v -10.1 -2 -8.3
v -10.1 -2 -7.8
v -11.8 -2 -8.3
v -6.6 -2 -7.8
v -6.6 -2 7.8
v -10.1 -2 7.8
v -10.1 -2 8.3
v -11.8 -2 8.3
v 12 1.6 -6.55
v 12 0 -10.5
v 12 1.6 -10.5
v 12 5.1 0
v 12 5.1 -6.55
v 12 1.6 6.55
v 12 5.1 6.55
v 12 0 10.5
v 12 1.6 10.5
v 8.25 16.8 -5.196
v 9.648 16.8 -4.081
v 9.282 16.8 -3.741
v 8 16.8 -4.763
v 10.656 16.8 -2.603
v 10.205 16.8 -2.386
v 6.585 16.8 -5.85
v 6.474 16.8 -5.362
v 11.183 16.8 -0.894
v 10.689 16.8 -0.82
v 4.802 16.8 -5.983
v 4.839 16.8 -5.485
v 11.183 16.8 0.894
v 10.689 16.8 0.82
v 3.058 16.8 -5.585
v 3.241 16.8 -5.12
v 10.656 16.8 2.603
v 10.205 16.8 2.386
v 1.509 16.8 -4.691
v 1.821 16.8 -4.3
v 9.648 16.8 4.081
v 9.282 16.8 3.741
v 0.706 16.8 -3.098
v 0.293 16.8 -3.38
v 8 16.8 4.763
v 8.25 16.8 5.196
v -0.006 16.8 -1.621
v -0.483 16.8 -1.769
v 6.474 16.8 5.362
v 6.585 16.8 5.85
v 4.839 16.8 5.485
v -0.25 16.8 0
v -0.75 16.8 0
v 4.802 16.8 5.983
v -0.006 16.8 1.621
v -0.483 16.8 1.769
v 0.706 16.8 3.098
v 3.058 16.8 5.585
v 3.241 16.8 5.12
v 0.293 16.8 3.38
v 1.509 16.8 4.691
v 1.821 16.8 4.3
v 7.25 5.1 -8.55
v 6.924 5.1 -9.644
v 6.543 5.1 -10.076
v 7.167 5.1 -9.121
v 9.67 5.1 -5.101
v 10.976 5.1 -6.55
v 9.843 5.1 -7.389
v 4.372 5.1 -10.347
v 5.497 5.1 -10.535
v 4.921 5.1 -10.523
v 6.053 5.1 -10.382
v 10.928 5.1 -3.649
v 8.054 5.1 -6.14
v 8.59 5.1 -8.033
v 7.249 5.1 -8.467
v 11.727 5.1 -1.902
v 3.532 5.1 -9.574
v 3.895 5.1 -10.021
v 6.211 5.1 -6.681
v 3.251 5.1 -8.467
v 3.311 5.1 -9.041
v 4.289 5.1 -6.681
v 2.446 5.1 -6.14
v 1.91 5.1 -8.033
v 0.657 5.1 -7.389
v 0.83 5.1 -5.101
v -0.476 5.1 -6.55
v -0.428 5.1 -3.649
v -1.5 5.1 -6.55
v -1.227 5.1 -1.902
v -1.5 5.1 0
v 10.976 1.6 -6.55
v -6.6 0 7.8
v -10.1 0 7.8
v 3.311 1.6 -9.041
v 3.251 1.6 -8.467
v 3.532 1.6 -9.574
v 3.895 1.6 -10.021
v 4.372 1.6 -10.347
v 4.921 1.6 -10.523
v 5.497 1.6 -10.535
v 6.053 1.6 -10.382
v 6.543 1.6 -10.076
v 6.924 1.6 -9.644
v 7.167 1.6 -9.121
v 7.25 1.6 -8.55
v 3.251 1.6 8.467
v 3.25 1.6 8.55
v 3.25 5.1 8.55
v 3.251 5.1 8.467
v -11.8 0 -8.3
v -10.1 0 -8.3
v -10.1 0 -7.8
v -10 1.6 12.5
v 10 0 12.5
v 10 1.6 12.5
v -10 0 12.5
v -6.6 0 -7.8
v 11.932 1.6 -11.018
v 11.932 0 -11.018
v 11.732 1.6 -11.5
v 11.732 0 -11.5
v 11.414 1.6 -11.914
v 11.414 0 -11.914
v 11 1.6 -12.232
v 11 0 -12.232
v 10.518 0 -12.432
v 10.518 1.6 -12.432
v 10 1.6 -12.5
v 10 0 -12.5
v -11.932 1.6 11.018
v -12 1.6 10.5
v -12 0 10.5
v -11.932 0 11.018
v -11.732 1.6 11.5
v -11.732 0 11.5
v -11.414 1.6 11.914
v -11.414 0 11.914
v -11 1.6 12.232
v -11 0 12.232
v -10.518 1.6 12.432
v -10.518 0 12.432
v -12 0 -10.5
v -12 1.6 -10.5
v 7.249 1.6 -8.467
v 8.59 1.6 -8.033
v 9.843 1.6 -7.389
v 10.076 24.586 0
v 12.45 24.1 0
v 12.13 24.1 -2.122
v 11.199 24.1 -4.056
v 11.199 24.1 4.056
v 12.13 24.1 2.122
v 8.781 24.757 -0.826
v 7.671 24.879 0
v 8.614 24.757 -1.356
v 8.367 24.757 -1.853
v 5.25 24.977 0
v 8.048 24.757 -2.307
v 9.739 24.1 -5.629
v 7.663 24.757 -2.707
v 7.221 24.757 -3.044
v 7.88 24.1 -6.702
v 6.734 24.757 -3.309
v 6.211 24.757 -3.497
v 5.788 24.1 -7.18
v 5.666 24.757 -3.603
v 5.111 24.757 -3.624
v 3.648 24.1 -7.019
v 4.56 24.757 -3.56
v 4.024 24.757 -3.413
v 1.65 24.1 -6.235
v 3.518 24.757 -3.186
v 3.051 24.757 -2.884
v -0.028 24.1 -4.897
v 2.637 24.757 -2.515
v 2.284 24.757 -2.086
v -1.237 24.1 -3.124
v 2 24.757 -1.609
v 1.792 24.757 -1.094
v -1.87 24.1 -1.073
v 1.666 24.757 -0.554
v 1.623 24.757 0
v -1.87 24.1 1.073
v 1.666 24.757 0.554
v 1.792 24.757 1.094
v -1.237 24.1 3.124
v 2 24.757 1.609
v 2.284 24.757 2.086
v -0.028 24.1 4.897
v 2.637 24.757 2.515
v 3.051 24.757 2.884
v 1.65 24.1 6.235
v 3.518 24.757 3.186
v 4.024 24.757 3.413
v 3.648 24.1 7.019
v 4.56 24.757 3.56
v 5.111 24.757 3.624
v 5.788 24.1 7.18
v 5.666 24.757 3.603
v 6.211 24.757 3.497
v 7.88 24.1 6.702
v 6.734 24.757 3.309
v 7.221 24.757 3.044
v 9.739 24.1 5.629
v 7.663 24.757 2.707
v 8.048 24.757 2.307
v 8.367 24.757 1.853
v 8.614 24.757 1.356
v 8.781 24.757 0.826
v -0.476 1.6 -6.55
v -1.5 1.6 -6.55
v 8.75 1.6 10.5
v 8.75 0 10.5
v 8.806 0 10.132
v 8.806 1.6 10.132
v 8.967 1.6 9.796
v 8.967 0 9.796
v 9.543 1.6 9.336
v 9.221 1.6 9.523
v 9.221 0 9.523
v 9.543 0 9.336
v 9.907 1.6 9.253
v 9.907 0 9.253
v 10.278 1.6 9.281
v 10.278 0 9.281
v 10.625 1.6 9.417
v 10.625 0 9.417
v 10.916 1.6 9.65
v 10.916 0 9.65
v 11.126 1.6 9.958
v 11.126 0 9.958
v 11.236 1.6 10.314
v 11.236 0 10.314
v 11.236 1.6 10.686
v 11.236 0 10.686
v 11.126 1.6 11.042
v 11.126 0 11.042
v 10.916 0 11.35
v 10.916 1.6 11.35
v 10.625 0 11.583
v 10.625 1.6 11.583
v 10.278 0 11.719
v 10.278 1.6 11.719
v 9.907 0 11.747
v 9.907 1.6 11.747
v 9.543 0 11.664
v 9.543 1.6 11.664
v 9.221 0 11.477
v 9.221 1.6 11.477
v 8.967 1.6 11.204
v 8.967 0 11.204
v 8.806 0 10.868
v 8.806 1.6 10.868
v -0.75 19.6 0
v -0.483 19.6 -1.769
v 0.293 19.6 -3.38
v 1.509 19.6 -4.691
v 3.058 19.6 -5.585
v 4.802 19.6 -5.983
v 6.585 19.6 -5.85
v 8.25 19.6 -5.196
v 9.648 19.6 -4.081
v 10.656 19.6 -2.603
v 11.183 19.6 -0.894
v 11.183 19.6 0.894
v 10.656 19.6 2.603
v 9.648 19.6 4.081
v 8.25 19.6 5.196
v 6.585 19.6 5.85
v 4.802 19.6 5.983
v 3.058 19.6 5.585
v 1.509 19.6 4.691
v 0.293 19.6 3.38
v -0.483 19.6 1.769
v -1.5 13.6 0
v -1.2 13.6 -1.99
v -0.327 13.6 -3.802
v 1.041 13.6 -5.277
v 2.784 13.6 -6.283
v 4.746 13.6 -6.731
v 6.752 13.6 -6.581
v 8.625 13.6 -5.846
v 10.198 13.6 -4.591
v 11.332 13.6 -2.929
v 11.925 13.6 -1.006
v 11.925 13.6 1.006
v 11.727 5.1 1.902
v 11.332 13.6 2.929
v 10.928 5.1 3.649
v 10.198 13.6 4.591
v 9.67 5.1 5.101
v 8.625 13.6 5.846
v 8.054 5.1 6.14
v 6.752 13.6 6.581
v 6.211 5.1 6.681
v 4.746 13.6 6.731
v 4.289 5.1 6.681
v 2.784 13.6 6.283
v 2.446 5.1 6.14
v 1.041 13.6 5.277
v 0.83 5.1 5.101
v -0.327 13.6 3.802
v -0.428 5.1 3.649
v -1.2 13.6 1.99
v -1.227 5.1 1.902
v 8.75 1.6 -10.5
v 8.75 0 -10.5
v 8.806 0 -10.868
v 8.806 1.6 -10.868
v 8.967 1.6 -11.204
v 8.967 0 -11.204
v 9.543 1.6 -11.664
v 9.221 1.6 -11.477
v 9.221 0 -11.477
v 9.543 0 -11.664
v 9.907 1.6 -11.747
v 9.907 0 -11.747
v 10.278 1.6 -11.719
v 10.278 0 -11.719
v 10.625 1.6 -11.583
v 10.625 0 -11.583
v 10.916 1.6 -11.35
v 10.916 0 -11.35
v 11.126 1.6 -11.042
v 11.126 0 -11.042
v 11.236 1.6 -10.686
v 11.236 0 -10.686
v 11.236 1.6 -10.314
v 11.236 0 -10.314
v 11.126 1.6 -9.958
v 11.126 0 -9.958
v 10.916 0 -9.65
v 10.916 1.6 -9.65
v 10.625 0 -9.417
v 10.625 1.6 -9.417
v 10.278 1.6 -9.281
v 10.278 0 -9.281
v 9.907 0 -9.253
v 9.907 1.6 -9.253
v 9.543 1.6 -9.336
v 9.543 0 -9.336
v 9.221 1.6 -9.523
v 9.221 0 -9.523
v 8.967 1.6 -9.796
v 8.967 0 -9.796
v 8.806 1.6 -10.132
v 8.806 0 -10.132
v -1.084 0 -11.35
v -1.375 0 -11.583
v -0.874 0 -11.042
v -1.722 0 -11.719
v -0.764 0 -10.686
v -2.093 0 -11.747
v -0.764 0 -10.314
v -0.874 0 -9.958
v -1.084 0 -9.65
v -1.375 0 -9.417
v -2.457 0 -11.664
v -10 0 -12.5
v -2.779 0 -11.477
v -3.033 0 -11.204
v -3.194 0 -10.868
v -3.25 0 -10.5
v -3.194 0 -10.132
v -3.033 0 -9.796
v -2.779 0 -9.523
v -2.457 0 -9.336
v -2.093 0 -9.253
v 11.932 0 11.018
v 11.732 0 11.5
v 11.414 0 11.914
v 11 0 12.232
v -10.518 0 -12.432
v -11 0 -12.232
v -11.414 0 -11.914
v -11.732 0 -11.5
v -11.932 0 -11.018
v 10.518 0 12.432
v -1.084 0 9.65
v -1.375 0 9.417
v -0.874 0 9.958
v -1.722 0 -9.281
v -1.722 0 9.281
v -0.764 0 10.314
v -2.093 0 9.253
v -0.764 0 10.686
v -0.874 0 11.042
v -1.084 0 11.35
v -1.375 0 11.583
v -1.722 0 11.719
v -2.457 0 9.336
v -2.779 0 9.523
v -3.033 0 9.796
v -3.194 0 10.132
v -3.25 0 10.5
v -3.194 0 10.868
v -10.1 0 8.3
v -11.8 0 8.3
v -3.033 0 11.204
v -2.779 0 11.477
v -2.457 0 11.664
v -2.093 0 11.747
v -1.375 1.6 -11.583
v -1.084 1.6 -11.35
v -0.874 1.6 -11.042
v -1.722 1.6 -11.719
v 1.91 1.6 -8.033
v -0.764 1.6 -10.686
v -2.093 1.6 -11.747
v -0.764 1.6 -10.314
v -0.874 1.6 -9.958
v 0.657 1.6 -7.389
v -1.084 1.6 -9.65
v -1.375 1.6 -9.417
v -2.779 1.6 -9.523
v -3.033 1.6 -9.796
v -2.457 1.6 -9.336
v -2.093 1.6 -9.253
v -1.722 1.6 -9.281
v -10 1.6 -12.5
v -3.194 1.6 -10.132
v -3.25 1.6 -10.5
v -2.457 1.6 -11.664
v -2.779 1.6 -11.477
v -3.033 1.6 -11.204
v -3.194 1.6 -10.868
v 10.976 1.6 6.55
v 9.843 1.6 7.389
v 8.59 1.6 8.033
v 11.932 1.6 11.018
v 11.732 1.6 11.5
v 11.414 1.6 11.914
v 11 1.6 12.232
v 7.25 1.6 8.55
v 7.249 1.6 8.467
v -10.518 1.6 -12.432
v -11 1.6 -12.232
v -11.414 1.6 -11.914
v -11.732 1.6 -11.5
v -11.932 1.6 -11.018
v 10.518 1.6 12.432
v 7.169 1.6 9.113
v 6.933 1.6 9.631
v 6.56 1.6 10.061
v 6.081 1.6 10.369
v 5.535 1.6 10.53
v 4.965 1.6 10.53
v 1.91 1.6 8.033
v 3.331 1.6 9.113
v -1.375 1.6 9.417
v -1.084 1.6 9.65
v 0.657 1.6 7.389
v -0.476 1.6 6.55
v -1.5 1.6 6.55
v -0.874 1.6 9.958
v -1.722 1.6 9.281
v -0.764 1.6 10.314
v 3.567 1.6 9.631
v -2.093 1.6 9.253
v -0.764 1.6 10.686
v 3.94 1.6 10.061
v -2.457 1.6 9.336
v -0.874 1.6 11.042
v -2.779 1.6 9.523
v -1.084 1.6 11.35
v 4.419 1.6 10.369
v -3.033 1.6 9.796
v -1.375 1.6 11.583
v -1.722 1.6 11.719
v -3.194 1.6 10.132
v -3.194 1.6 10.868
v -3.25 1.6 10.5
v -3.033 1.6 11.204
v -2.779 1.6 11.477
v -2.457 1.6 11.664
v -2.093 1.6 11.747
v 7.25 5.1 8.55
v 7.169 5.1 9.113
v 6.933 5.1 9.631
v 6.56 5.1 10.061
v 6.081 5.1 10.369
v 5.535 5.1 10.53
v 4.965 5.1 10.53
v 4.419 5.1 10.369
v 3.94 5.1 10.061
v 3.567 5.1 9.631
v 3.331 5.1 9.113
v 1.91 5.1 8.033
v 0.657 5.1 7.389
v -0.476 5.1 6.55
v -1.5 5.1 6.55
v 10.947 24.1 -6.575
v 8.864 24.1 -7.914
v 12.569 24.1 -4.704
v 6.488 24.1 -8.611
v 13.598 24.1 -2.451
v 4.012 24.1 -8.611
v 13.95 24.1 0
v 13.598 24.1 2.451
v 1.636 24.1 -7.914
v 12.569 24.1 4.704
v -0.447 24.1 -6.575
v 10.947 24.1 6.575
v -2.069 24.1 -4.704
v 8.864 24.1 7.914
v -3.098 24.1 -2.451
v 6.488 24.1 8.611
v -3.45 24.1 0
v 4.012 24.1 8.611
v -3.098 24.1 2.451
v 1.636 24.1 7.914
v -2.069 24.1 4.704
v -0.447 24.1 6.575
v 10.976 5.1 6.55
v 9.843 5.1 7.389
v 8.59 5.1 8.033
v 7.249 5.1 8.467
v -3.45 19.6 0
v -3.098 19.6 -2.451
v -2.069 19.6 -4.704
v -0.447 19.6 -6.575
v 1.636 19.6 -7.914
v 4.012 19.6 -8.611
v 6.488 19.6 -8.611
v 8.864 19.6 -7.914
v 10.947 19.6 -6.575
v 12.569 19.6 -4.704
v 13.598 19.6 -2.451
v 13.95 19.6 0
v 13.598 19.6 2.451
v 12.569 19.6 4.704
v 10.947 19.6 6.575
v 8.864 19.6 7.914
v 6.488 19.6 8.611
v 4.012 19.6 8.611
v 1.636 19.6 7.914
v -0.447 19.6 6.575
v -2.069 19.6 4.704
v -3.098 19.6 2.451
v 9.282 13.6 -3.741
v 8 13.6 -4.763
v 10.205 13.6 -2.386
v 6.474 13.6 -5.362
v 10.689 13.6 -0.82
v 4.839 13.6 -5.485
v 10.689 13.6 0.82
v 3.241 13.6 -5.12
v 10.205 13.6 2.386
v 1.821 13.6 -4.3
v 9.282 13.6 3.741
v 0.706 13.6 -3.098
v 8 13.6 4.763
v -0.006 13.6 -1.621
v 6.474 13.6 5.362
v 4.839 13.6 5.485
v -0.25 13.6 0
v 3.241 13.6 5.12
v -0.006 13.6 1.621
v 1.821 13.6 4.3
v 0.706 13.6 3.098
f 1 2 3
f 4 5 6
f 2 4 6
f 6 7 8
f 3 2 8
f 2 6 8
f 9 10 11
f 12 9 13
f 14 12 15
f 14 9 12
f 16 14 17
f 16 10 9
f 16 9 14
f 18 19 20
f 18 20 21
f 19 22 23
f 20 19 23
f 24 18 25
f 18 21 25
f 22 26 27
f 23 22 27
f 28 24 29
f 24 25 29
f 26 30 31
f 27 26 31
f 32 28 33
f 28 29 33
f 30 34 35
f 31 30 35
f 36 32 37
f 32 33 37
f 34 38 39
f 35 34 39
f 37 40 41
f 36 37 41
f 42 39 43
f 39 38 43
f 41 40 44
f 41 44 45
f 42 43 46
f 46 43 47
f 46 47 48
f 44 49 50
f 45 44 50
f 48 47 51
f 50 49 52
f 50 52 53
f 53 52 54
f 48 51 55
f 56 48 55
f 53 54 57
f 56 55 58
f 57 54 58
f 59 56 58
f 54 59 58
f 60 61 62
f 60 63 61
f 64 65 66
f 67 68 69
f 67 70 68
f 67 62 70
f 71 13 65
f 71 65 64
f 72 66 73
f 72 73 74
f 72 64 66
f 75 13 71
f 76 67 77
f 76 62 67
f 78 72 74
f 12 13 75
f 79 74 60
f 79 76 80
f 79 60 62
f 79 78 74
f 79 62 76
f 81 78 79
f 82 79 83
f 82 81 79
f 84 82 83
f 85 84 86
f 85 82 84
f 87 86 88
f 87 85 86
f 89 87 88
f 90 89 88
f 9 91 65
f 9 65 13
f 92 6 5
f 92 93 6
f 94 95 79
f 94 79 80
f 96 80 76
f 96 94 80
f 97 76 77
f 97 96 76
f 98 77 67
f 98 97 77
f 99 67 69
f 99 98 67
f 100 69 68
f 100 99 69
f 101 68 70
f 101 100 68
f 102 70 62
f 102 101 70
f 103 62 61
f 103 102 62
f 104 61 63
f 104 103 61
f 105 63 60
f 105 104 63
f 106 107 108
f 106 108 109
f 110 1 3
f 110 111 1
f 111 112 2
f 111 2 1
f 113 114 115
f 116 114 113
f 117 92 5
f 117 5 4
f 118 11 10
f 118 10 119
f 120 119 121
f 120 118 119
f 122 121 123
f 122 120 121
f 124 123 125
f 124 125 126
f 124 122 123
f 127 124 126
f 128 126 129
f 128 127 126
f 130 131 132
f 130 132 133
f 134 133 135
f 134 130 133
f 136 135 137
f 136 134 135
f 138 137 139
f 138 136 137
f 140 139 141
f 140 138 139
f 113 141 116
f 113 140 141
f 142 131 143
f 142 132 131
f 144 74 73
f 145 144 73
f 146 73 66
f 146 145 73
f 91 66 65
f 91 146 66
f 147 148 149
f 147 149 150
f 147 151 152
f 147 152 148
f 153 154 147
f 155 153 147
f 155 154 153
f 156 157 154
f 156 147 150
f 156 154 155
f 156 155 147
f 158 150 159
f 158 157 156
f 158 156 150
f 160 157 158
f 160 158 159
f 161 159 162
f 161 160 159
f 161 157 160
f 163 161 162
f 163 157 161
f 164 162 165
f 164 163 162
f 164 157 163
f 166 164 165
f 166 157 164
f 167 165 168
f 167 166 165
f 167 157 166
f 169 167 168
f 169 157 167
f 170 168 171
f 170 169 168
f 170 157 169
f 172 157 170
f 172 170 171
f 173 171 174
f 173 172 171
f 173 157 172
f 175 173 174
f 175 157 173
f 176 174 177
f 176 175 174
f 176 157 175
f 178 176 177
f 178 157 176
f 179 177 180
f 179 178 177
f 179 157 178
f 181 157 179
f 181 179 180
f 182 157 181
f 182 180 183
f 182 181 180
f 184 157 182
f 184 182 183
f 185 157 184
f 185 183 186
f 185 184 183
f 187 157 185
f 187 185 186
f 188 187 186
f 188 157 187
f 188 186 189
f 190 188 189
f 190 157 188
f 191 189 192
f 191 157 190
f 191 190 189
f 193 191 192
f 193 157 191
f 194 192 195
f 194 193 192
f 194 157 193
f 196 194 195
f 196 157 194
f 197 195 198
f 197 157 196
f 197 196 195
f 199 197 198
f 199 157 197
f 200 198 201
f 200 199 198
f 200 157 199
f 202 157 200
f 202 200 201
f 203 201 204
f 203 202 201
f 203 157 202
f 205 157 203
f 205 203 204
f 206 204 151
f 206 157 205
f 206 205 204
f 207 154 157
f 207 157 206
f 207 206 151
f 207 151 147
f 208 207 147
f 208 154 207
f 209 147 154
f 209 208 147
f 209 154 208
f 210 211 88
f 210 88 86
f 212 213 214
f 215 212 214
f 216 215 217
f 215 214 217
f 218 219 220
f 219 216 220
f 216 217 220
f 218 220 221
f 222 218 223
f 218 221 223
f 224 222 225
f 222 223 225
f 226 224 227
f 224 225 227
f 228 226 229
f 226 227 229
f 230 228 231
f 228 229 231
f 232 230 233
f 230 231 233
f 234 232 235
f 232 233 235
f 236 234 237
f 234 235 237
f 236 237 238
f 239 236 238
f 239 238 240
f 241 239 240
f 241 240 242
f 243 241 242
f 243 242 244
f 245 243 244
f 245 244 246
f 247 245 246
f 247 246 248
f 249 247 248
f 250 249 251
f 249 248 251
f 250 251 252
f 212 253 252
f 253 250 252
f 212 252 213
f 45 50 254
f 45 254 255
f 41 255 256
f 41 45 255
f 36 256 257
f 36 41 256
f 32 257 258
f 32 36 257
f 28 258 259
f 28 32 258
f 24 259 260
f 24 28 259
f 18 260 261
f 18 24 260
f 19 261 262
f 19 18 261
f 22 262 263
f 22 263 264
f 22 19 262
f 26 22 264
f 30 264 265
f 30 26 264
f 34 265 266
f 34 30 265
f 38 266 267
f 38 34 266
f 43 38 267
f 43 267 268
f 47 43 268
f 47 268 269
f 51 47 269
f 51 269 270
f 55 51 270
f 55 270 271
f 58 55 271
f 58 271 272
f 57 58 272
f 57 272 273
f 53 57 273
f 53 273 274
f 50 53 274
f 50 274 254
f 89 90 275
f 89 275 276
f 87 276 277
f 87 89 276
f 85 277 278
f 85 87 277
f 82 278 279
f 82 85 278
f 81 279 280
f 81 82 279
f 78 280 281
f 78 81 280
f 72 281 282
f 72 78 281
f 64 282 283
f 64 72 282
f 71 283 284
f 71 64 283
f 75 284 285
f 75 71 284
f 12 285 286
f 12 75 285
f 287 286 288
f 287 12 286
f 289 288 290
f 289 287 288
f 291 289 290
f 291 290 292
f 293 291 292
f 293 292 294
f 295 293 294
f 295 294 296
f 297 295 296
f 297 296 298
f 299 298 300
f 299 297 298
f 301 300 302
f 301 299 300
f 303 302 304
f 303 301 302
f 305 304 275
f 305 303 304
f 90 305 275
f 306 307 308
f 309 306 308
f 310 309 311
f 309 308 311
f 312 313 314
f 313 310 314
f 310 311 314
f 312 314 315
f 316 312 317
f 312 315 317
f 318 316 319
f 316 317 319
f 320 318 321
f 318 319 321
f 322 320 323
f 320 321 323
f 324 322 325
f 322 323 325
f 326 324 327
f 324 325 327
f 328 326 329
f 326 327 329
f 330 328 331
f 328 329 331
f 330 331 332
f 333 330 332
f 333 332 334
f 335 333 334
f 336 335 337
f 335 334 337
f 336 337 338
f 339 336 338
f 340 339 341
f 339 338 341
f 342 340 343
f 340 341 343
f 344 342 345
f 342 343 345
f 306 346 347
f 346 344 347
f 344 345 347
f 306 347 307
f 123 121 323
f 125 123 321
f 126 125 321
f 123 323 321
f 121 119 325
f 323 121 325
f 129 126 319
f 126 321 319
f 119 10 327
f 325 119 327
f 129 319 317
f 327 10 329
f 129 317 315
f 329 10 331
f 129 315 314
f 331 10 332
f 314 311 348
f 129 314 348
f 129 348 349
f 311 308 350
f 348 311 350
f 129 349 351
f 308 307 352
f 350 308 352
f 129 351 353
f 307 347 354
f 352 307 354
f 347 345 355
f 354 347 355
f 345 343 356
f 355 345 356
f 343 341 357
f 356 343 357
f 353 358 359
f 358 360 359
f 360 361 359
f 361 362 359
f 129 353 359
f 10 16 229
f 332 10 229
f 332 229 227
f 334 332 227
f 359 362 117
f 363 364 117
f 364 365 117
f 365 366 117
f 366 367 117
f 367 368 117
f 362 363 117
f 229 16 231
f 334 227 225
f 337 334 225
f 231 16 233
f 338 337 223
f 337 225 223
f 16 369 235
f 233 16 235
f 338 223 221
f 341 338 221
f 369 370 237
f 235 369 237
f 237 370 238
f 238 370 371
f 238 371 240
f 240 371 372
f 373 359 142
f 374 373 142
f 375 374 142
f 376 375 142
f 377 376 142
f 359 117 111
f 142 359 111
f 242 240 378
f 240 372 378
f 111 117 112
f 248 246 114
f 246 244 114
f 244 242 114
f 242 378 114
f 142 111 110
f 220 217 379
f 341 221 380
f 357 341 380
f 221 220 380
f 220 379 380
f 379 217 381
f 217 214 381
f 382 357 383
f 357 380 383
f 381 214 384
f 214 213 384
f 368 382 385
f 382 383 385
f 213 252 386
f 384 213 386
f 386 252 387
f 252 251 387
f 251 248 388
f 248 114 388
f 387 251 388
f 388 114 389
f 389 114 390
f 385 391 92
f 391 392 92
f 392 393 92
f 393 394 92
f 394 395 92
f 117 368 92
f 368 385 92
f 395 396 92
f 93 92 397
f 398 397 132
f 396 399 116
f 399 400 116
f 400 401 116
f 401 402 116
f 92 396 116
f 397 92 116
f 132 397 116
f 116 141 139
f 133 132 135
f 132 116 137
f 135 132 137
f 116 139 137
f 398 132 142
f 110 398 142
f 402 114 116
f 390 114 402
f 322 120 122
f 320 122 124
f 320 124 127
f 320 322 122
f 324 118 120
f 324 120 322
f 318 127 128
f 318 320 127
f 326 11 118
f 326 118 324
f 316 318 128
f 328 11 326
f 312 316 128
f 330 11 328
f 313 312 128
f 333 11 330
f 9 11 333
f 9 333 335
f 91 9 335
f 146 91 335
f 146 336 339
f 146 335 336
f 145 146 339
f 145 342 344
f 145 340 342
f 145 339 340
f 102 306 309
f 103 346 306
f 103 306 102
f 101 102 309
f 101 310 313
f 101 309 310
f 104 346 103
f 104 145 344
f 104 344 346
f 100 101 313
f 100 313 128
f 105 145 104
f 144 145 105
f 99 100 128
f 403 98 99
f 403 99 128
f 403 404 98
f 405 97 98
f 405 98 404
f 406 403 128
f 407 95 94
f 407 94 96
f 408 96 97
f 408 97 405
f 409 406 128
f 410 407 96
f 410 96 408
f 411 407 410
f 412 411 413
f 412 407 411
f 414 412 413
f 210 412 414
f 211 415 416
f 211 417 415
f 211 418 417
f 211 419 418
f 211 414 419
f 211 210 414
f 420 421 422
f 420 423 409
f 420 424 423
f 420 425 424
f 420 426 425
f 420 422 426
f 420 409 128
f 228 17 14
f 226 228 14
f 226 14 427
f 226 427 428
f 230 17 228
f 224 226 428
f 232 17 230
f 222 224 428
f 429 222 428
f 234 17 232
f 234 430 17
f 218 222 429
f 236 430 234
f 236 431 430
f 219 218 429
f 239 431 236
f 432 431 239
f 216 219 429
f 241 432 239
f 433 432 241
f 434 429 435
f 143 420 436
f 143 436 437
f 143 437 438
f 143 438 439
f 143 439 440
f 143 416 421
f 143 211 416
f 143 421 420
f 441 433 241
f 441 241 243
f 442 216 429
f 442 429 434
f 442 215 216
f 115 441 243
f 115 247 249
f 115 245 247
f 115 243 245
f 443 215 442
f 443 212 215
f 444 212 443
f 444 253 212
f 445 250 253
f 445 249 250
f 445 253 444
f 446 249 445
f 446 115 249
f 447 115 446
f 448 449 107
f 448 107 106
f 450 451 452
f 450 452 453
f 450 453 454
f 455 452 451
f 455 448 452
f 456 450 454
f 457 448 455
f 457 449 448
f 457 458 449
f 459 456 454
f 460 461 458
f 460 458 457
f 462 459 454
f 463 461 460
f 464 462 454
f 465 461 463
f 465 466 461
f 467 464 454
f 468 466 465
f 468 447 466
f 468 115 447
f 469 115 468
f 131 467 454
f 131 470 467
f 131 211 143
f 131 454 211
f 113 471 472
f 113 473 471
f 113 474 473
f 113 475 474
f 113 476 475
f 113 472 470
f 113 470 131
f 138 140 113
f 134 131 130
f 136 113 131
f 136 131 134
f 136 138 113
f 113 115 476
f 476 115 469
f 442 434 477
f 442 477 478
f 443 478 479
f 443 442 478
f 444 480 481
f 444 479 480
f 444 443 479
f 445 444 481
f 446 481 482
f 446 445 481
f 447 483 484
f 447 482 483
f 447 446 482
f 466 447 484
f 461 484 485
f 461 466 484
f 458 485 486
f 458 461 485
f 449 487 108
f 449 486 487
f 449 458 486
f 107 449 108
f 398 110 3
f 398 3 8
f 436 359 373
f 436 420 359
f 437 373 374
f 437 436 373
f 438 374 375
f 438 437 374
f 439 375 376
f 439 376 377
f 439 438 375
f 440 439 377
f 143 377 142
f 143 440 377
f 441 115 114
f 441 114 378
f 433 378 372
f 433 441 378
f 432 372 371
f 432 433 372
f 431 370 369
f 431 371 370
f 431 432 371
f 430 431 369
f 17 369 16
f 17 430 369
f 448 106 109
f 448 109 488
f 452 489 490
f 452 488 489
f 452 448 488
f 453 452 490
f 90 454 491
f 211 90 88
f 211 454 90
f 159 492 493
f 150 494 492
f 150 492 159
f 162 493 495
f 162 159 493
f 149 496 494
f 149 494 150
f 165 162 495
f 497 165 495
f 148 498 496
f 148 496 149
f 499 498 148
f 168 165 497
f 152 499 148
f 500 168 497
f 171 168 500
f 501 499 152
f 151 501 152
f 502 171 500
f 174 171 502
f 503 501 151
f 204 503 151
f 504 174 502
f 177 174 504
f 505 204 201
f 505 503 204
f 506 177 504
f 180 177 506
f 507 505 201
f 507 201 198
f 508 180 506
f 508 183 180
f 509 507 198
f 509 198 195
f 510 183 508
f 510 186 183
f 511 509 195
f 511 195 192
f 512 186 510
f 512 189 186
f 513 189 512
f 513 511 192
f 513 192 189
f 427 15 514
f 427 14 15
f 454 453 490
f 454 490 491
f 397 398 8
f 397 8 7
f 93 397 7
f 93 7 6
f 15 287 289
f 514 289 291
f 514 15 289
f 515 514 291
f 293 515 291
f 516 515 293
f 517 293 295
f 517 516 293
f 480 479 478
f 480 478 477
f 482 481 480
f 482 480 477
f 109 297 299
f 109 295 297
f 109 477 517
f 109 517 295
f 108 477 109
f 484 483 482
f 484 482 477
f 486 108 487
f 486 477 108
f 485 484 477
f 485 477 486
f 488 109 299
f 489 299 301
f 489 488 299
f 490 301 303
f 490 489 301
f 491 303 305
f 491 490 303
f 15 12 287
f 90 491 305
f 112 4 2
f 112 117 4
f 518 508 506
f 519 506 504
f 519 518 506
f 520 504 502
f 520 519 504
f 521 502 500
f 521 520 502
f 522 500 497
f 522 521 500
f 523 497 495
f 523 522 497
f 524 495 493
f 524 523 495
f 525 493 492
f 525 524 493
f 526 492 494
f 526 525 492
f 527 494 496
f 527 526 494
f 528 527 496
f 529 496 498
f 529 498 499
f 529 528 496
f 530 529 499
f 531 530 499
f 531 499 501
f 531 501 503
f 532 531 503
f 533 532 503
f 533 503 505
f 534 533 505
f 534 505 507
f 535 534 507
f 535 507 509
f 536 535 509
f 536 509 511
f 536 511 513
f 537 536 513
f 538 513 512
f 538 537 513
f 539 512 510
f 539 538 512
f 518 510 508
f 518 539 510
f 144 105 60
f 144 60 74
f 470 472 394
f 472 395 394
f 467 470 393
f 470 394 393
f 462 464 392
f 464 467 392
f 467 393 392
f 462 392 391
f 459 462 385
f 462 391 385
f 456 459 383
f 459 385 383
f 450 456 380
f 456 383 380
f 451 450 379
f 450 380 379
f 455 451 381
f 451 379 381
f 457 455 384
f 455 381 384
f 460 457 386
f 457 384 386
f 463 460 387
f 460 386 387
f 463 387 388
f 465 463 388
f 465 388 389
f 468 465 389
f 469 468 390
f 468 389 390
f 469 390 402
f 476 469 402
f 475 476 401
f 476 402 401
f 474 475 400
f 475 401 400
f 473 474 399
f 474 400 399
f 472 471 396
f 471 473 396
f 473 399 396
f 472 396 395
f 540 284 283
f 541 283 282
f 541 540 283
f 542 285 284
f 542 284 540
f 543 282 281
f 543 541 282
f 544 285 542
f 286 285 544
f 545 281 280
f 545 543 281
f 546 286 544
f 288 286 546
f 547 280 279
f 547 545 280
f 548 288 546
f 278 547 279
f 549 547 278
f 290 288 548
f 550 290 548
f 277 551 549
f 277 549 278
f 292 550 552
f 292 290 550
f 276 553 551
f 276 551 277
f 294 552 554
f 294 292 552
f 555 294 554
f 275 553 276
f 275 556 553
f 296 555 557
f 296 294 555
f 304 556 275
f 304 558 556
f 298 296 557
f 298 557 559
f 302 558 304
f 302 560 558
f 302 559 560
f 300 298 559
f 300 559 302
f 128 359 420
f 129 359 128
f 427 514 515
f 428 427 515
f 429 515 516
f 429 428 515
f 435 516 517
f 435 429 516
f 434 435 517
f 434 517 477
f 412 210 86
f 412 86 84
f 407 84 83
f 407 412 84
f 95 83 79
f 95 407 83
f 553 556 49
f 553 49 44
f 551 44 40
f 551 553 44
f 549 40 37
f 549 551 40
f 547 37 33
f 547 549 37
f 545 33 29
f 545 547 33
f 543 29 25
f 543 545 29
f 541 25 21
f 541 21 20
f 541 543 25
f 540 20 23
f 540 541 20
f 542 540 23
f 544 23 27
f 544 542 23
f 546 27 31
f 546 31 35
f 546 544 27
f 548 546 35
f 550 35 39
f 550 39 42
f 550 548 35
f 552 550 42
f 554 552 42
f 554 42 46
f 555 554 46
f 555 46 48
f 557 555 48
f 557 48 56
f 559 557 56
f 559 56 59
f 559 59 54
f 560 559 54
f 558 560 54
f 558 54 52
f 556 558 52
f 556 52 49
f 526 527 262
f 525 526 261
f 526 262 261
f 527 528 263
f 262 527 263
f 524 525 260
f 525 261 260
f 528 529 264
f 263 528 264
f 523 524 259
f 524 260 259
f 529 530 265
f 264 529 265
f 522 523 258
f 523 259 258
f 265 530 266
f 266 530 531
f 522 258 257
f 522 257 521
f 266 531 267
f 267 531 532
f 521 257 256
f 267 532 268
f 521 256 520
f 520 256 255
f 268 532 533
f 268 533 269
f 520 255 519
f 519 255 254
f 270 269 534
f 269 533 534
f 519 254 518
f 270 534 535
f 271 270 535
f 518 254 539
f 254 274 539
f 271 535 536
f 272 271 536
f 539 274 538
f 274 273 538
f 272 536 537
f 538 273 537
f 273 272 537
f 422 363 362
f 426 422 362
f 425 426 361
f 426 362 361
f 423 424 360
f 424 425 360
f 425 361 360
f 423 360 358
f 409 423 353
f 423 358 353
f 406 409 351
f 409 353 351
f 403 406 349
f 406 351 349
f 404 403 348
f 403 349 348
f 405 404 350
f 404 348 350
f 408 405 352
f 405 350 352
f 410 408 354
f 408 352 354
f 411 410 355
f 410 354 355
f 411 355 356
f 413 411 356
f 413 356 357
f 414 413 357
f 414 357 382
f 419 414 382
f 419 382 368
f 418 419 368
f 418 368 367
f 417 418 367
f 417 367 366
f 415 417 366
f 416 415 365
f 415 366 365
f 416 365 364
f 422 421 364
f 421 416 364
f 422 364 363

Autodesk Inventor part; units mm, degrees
ref_plane "YZ Plane" through (0, 0, 0) normal (1, 0, 0) x (0, 1, 0)
ref_plane "XZ Plane" through (0, 0, 0) normal (0, 1, 0) x (-1, 0, 0)
ref_plane "XY Plane" through (0, 0, 0) normal (0, 0, 1) x (1, 0, 0)
sketch "Sketch1" plane through (0, 0, 0) normal (0, 1, 0) x (-1, 0, 0)
  line L0 (12, -12.5) -> (-12, -12.5)
  line L1 (-12, -12.5) -> (-12, 12.5)
  line L2 (-12, 12.5) -> (12, 12.5)
  line L3 (12, 12.5) -> (12, -12.5)
  line L4 (12, -12.5) -> (-12, 12.5) construction
  line L5 (-12, -12.5) -> (12, 12.5) construction
  circle A0 centre (2, 10.5) radius 1.25
  circle A1 centre (-10, 10.5) radius 1.25
  circle A2 centre (2, -10.5) radius 1.25
  circle A3 centre (-10, -10.5) radius 1.25
  line L6 (12, 0) -> (-12, 0) construction
  line L7 (10.1, -8.3) -> (11.8, -8.3)
  line L8 (11.8, -8.3) -> (11.8, 8.3)
  line L9 (11.8, 8.3) -> (10.1, 8.3)
  line L10 (10.1, 8.3) -> (10.1, -8.3)
  line L11 (10.1, -8.3) -> (11.8, 8.3) construction
  line L12 (11.8, -8.3) -> (10.1, 8.3) construction
  line L13 (6.6, -7.8) -> (10.1, -7.8)
  line L14 (10.1, -7.8) -> (10.1, 7.8)
  line L15 (10.1, 7.8) -> (6.6, 7.8)
  line L16 (6.6, 7.8) -> (6.6, -7.8)
  line L17 (6.6, -7.8) -> (10.1, 7.8) construction
  line L18 (10.1, -7.8) -> (6.6, 7.8) construction
  line L19 (1.5, -6.55) -> (-12, -6.55)
  line L20 (-12, -6.55) -> (-12, 6.55)
  line L21 (-12, 6.55) -> (1.5, 6.55)
  line L22 (1.5, 6.55) -> (1.5, -6.55)
  line L23 (1.5, -6.55) -> (-12, 6.55) construction
  line L24 (-12, -6.55) -> (1.5, 6.55) construction
  circle A4 centre (-5.25, 0) radius 6.75
  line L25 (-5.25, 6.55) -> (-5.25, -6.55) construction
  line L26 (-3.25, 8.55) -> (-3.25, -6.55)
  line L27 (-7.25, -8.55) -> (-7.25, 8.55)
  circle A5 centre (-5.25, 8.55) radius 2
  circle A6 centre (-5.25, -8.55) radius 2
  line L28 (-3.25, -8.55) -> (-3.25, -6.55)
  circle A7 centre (-5.25, 0) radius 6
  circle A8 centre (-5.25, 0) radius 5.5
  circle A9 centre (-5.25, 0) radius 8.7
  point P0 (0, 0)
  point P1 (10.95, 0)
  point P2 (8.35, 0)
  point P3 (-12, 5.4889)
  point P4 (-12, -5.4889)
  point P5 (-10.976, -6.55)
  point P6 (-7.25, -8.467)
  point P7 (-3.25, -8.467)
  point P8 (0.476, -6.55)
  point P9 (0.476, 6.55)
  point P10 (-3.25, 8.467)
  point P11 (-7.25, 8.467)
  point P12 (-10.976, 6.55)
  point P13 (12, -8.3)
  dimension "d0" = 25
  dimension "d1" = 24
  dimension "d2" = 2.5
  dimension "d3" = 21
  dimension "d4" = 12
  dimension "d5" = 2
  dimension "d6" = 16.6
  dimension "d7" = 1.7
  dimension "d8" = 15.6
  dimension "d9" = 3.5
  dimension "d10" = 13.5
  dimension "d11" = 13.1
  dimension "d12" = 4
  dimension "d13" = 4
  dimension "d14" = 11
  dimension "d15" = 12
  dimension "d16" = 17.4
  dimension "d35" = 0.2
  dimension "d36" = 4.75
  dimension "d37" = 10.5
extrude "Extrusion1" add sketch "Sketch1" along normal blind 1.6 contours L0 L1 L19 A9 L27 A6 L22 L21 L26 A5 L2 L3 | L1 A9 L19 | L1 A4 L27 L19 A9 | L19 L27 A9 | L21 A9 L1 | L1 A9 L21 L27 A4 | A4 L27 A7 | L27 A4 L19 | L19 A4 A6 L27 | A9 A6 L27 | A6 A4 A9 | A9 L27 L21 | L27 L21 A4 | A4 L21 L26 A7 L27 | L27 A7 L26 A4 L19 | L19 A6 A4 | A6 A4 | A6 A4 L19 L28 | L28 L19 A9 | L27 A5 A4 L21 | A9 A5 A4 | L27 A5 L26 A9 | A4 A5 L21 | A7 L26 A8 L27 | L27 A8 A7 | L27 A8 L26 A7 | L19 A4 A6 | L26 A4 L22 A9 L19 | L19 A4 L26 | A9 L22 L19 | A4 A5 | A9 L21 L26 | L26 L21 A4 A5 | A5 A4 L21 | A8 L26 L27 | L27 A8 | A7 L26 A8 | L26 A4 A7 | L22 A9 | L26 A4 L21 | L21 A9 L22 A4 L26 | L21 L22 A9 | A8 L26 | L10 L9 L8 L7 | L13 L16 L15 L10
extrude "Extrusion2" add sketch "Sketch1" along normal blind 3.5 from surface at 1.6 contours L1 A9 L19 | L1 A4 L27 L19 A9 | L19 L27 A9 | L21 A9 L1 | L1 A9 L21 L27 A4 | A4 L27 A7 | L27 A4 L19 | L19 A4 A6 L27 | A9 A6 L27 | A6 A4 A9 | A9 L27 L21 | L27 L21 A4 | A4 L21 L26 A7 L27 | L27 A7 L26 A4 L19 | L19 A6 A4 | A6 A4 | A6 A4 L19 L28 | L28 L19 A9 | L27 A5 A4 L21 | A9 A5 A4 | L27 A5 L26 A9 | A4 A5 L21 | A7 L26 A8 L27 | L27 A8 A7 | L27 A8 L26 A7 | L19 A4 A6 | L26 A4 L22 A9 L19 | L19 A4 L26 | A9 L22 L19 | A4 A5 | A9 L21 L26 | L26 L21 A4 A5 | A5 A4 L21 | A8 L26 L27 | L27 A8 | A7 L26 A8 | L26 A4 A7 | L26 A4 L21 | L21 A9 L22 A4 L26 | L21 L22 A9 | A8 L26
extrude "Extrusion3" add sketch "Sketch1" along normal blind 8.5 from surface at 5.1 contours A4 L27 A7 | A4 L21 L26 A7 L27 | L27 A7 L26 A4 L19 | L19 A6 A4 | A6 A4 | A4 A5 L21 | A7 L26 A8 L27 | L27 A8 A7 | L27 A8 L26 A7 | L19 A4 A6 | A4 A5 | A5 A4 L21 | A8 L26 L27 | L27 A8 | A7 L26 A8 | L26 A4 A7 | A8 L26
extrude "Extrusion4" add sketch "Sketch1" along normal blind 3.2 from surface at 13.6 contours A8 L26 L27 | L27 A8 | A8 L26
extrude "Extrusion5" add sketch "Sketch1" along normal blind 2.8 from surface at 16.8 contours A7 L26 A8 L27 | L27 A8 A7 | L27 A8 L26 A7 | A8 L26 L27 | L27 A8 | A7 L26 A8 | A8 L26
extrude "Extrusion6" add sketch "Sketch1" along normal blind 4.5 from surface at 19.6 contours A9 L1 | L1 A4 L27 L19 A9 | L19 L27 A9 | L1 A9 L21 L27 A4 | A4 L27 A7 | L27 A4 L19 | L19 A4 A6 L27 | A6 A4 A9 | A9 L27 L21 | L27 L21 A4 | A4 L21 L26 A7 L27 | L27 A7 L26 A4 L19 | L19 A6 A4 | A6 A4 | A6 A4 L19 L28 | L28 L19 A9 | L27 A5 A4 L21 | A9 A5 A4 | A4 A5 L21 | A7 L26 A8 L27 | L27 A8 A7 | L27 A8 L26 A7 | L19 A4 A6 | L26 A4 L22 A9 L19 | L19 A4 L26 | A4 A5 | A9 L21 L26 | L26 L21 A4 A5 | A5 A4 L21 | A8 L26 L27 | L27 A8 | A7 L26 A8 | L26 A4 A7 | L22 A9 | L26 A4 L21 | L21 A9 L22 A4 L26 | A8 L26
extrude "Extrusion7" add sketch "Sketch1" against normal blind 2 contours L10 L9 L8 L7 | L13 L16 L15 L10
fillet "Fillet1" radius 2 4 edges at (-12, 0.8, -12.5) (-12, 0.8, 12.5) (12, 0.8, 12.5) (12, 0.8, -12.5)
sketch "Sketch2" plane through (0, 0, 0) normal (0, 0, 1) x (1, 0, 0)
  line L0 (-3.45, 24.1) -> (13.95, 24.1) projected
  line L1 (5.25, 24.1) -> (5.25, 0)
  line L2 (-10, 0) -> (10, 0) projected
  arc A0 (12.45, 24.1) -> (-1.95, 24.1) centre (5.25, -5.0232) ccw
  line L3 (12.45, 24.1) -> (-1.95, 24.1)
  line L4 (5.25, 24.1) -> (5.25, 24.9768)
  point P0 (0, 0)
  dimension "d32" = 1.5
  dimension "d33" = 30
revolve "Revolution1" add sketch "Sketch2" angle 360 about axis through (5.25, 24.1, 0) along (0, 1, 0) picked at (9.2588, 24.262) contours L4 A0 L0
sketch "Sketch3" plane through (0, 0, 0) normal (0, 0, 1) x (1, 0, 0)
  line L0 (-3.45, 24.1) -> (13.95, 24.1) construction
  line L1 (5.25, 24.1) -> (5.25, 38.8159)
  line L2 (5.25, 24.1) -> (119.5505, 34.1)
  line L3 (119.5505, 34.1) -> (5.25, 34.1) construction
  point P0 (0, 0)
  dimension "d38" = 85
  dimension "d41" = 10
properties part number "Arducam Camera"
